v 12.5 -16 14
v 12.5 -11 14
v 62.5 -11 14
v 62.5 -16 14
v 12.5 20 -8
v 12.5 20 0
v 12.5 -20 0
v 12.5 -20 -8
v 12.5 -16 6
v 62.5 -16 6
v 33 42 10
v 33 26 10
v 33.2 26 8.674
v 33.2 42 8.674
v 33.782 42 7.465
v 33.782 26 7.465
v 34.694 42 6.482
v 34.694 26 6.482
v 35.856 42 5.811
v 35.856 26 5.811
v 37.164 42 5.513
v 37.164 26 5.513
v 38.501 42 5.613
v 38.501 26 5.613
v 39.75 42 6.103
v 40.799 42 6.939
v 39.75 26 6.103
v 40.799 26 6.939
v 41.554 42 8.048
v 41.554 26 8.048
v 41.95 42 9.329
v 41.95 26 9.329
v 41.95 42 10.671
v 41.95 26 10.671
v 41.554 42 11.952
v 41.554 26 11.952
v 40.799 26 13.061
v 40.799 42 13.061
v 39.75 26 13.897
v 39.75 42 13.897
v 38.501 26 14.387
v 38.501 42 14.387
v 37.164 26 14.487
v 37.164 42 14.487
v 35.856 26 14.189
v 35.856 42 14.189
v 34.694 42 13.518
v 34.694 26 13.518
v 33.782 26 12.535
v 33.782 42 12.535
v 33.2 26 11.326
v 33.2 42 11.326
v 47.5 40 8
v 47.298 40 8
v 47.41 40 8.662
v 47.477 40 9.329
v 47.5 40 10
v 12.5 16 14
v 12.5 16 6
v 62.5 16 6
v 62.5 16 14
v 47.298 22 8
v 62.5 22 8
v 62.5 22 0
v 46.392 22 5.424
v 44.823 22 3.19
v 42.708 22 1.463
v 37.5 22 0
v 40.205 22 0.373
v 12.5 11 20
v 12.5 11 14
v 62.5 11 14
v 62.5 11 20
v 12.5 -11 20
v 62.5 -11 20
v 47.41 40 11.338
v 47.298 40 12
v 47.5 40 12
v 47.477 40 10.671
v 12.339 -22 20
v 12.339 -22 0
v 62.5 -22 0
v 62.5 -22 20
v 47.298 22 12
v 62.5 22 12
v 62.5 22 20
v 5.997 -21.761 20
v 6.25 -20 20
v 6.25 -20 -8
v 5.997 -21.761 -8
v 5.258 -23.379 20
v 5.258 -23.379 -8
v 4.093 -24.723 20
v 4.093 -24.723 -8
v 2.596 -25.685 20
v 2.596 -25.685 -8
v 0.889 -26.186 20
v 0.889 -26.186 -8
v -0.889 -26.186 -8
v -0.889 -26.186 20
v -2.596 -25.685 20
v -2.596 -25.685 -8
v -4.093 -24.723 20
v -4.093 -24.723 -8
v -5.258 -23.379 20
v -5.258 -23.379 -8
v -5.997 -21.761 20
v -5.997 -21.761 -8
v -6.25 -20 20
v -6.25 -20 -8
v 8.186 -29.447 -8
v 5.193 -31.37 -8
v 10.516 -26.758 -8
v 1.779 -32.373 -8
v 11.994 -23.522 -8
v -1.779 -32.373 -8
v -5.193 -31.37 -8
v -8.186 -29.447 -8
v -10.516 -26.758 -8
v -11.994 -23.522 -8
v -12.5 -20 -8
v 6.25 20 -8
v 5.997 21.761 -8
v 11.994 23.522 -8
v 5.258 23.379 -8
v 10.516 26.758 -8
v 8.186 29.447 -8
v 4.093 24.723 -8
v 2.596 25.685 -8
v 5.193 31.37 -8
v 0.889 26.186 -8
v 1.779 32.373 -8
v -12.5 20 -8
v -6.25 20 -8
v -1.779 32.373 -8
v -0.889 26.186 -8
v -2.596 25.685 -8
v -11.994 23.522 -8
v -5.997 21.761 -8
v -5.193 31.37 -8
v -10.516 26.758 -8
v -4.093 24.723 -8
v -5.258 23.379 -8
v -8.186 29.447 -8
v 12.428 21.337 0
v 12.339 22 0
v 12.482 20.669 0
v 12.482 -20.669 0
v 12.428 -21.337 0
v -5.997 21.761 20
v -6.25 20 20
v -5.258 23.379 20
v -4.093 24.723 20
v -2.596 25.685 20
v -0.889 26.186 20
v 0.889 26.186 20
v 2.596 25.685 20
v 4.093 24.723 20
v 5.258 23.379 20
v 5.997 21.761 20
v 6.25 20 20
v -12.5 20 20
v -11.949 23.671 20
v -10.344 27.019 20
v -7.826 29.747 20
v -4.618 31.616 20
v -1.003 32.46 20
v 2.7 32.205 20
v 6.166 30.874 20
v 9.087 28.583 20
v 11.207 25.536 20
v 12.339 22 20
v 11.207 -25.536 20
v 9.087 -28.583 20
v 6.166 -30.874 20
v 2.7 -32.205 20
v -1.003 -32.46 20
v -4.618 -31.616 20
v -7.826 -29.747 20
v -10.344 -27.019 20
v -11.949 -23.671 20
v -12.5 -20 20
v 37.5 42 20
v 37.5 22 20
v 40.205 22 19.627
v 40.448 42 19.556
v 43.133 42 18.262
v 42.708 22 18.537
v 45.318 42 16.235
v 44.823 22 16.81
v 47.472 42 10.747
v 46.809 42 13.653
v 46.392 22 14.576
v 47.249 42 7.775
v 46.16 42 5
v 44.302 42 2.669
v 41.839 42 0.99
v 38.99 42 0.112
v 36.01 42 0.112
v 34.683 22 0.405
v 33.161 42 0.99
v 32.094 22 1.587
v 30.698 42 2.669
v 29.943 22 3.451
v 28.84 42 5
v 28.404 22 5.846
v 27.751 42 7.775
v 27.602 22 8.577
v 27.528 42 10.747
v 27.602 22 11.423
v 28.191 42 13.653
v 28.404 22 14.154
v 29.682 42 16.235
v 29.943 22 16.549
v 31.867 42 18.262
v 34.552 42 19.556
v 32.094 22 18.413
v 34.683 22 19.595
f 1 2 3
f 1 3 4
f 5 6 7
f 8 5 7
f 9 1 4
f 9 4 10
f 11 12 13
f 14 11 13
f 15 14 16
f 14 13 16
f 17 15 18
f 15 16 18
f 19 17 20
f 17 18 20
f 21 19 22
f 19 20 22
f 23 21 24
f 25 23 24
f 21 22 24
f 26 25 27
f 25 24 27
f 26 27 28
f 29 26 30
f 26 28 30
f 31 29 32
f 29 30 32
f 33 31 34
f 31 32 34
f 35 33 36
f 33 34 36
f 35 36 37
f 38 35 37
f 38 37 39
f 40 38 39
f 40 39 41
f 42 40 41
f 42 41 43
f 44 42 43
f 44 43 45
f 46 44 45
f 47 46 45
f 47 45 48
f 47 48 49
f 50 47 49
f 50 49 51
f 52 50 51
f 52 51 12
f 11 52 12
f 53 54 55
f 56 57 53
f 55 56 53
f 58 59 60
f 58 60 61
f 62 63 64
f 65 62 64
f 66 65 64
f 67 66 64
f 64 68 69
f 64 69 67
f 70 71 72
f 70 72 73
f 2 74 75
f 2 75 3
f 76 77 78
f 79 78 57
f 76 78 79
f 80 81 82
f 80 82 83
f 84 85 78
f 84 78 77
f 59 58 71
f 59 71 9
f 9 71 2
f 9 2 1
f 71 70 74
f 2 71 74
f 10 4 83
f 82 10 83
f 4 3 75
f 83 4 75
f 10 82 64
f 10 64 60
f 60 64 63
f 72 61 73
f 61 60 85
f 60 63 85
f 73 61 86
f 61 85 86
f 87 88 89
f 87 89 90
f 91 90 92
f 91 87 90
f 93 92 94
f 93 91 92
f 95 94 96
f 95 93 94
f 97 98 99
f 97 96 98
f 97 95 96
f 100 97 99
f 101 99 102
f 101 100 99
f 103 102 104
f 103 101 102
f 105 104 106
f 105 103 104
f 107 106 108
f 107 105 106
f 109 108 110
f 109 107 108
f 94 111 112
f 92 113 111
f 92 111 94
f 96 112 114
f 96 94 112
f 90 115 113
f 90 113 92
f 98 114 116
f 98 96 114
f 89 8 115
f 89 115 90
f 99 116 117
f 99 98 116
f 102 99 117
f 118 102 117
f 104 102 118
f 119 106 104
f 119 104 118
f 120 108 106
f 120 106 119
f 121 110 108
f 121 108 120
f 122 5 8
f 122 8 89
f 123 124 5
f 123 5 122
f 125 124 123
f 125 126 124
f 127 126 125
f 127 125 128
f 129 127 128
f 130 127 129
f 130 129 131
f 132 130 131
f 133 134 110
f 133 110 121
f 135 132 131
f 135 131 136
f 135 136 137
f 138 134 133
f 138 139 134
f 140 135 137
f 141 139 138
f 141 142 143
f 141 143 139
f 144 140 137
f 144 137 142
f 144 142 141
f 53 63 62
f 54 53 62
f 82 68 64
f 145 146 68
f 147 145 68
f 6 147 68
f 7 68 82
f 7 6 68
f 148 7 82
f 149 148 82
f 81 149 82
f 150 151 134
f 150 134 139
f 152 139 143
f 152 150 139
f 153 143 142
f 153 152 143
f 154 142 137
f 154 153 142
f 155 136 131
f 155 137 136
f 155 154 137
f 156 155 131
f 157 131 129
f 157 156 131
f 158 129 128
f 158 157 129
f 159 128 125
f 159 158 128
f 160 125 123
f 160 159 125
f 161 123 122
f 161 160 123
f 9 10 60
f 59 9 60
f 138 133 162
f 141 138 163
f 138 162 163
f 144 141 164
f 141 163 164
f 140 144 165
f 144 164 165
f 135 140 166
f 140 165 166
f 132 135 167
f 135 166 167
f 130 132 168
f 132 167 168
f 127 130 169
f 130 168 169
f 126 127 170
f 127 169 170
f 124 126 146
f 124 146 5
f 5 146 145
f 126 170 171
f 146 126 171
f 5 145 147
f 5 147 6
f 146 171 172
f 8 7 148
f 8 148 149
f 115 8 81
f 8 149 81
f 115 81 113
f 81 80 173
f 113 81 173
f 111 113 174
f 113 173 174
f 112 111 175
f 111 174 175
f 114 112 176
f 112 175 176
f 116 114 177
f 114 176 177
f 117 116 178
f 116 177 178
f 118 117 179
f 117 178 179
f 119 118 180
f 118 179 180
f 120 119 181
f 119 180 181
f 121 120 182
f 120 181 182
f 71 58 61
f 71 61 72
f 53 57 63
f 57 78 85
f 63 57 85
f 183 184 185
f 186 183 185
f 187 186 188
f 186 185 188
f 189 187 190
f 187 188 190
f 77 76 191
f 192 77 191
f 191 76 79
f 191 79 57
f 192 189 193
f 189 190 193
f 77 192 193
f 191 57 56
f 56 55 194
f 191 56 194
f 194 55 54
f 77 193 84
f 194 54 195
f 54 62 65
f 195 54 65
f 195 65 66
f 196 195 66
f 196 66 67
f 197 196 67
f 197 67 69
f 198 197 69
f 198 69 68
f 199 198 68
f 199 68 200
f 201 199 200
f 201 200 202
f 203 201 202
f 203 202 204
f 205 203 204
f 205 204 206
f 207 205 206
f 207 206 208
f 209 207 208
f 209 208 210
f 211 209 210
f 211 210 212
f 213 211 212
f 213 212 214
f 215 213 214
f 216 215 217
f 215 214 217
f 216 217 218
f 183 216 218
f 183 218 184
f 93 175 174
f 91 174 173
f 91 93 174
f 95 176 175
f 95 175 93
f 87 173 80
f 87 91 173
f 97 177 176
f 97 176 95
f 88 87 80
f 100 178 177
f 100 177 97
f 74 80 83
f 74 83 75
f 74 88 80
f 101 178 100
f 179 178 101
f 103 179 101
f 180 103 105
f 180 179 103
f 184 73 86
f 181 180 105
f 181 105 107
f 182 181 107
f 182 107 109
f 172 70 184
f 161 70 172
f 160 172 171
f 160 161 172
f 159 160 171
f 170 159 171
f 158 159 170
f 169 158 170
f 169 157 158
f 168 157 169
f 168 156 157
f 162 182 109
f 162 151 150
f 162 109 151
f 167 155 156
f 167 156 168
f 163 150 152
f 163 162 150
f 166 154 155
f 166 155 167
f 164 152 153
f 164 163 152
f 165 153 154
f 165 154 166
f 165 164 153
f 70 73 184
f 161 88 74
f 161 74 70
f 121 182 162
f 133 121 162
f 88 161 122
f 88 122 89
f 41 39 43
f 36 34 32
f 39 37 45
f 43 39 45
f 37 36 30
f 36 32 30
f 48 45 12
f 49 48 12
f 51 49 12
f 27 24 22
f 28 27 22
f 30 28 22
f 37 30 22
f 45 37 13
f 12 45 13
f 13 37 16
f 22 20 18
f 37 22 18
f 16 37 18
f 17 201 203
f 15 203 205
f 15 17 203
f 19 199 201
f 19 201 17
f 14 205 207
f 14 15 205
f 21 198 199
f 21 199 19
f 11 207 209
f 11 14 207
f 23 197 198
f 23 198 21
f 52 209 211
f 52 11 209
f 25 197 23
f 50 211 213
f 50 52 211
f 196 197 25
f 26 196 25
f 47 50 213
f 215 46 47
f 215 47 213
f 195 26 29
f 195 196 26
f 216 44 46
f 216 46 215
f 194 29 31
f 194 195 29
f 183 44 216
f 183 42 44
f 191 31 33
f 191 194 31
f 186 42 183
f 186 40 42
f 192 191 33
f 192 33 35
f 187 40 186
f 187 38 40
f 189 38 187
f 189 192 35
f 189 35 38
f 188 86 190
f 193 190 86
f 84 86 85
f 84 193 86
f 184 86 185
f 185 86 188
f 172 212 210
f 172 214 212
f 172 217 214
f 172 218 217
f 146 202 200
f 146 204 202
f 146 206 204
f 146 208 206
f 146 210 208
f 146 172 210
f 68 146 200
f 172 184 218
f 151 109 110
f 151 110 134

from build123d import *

# Parameters (mm, degrees)
BOSS_EXTRUDE1_DEPTH = 62.5
BOSS_EXTRUDE2_DEPTH = 28
CUT_EXTRUDE1_DEPTH  = 76.805672611
SKETCH5_R           = 10
BOSS_EXTRUDE3_DEPTH = 20
HOLE1_D             = 9
HOLE1_DEPTH         = 16
BOSS_EXTRUDE5_START = -10
BOSS_EXTRUDE5_DEPTH = 2


with BuildPart() as part:
    # Sketch1 → Boss-Extrude1 (new body)
    with BuildSketch(Plane(origin=(0, 0, 0), x_dir=(0, 0, -1), z_dir=(1, 0, 0))):
        Polygon((-14, 16), (-14, 11), (-20, 11), (-20, 22), (0, 22), (0, -22), (-20, -22), (-20, -11), (-14, -11), (-14, -16), (-6, -16), (-6, 16), align=None)
    extrude(amount=BOSS_EXTRUDE1_DEPTH)

    # Sketch3 → Boss-Extrude2 (add)
    with BuildSketch(Plane.XY.offset(20)):
        with BuildLine():
            Line((12.5, 20), (12.5, -20))
            ThreePointArc((12.5, -20), (0, -32.5), (-12.5, -20))
            Line((-12.5, -20), (-12.5, 20))
            ThreePointArc((-12.5, 20), (0, 32.5), (12.5, 20))
        make_face()
    extrude(amount=-BOSS_EXTRUDE2_DEPTH)

    # Sketch4 → Cut-Extrude1 (cut, through all)
    with BuildSketch(Plane.XY.offset(20)):
        with BuildLine():
            Line((6.25, 20), (6.25, -20))
            ThreePointArc((6.25, -20), (0, -26.25), (-6.25, -20))
            Line((-6.25, -20), (-6.25, 20))
            ThreePointArc((-6.25, 20), (0, 26.25), (6.25, 20))
        make_face()
    extrude(amount=-CUT_EXTRUDE1_DEPTH, mode=Mode.SUBTRACT)

    # Sketch5 → Boss-Extrude3 (add)
    with BuildSketch(Plane(origin=(0, 22, 0), x_dir=(1, 0, 0), z_dir=(0, 1, 0))):
        with Locations(Location((37.5, -10, 0), (0, 0, 270))):
            Circle(SKETCH5_R)
    extrude(amount=BOSS_EXTRUDE3_DEPTH)

    # Hole1
    with Locations(Plane(origin=(0, 42, 0), x_dir=(1, 0, 0), z_dir=(0, 1, 0))):
        with Locations((37.5, -10)):
            Hole(HOLE1_D / 2, depth=HOLE1_DEPTH)

    # Sketch9 → Boss-Extrude5 (add, symmetric)
    with BuildSketch(Plane.XY.offset(20).offset(BOSS_EXTRUDE5_START)):
        Polygon((47.5, 40), (62.5, 22), (47.5, 22), (46.5, 22), (46.5, 40), align=None)
    extrude(amount=BOSS_EXTRUDE5_DEPTH, both=True)


solid = part.part
